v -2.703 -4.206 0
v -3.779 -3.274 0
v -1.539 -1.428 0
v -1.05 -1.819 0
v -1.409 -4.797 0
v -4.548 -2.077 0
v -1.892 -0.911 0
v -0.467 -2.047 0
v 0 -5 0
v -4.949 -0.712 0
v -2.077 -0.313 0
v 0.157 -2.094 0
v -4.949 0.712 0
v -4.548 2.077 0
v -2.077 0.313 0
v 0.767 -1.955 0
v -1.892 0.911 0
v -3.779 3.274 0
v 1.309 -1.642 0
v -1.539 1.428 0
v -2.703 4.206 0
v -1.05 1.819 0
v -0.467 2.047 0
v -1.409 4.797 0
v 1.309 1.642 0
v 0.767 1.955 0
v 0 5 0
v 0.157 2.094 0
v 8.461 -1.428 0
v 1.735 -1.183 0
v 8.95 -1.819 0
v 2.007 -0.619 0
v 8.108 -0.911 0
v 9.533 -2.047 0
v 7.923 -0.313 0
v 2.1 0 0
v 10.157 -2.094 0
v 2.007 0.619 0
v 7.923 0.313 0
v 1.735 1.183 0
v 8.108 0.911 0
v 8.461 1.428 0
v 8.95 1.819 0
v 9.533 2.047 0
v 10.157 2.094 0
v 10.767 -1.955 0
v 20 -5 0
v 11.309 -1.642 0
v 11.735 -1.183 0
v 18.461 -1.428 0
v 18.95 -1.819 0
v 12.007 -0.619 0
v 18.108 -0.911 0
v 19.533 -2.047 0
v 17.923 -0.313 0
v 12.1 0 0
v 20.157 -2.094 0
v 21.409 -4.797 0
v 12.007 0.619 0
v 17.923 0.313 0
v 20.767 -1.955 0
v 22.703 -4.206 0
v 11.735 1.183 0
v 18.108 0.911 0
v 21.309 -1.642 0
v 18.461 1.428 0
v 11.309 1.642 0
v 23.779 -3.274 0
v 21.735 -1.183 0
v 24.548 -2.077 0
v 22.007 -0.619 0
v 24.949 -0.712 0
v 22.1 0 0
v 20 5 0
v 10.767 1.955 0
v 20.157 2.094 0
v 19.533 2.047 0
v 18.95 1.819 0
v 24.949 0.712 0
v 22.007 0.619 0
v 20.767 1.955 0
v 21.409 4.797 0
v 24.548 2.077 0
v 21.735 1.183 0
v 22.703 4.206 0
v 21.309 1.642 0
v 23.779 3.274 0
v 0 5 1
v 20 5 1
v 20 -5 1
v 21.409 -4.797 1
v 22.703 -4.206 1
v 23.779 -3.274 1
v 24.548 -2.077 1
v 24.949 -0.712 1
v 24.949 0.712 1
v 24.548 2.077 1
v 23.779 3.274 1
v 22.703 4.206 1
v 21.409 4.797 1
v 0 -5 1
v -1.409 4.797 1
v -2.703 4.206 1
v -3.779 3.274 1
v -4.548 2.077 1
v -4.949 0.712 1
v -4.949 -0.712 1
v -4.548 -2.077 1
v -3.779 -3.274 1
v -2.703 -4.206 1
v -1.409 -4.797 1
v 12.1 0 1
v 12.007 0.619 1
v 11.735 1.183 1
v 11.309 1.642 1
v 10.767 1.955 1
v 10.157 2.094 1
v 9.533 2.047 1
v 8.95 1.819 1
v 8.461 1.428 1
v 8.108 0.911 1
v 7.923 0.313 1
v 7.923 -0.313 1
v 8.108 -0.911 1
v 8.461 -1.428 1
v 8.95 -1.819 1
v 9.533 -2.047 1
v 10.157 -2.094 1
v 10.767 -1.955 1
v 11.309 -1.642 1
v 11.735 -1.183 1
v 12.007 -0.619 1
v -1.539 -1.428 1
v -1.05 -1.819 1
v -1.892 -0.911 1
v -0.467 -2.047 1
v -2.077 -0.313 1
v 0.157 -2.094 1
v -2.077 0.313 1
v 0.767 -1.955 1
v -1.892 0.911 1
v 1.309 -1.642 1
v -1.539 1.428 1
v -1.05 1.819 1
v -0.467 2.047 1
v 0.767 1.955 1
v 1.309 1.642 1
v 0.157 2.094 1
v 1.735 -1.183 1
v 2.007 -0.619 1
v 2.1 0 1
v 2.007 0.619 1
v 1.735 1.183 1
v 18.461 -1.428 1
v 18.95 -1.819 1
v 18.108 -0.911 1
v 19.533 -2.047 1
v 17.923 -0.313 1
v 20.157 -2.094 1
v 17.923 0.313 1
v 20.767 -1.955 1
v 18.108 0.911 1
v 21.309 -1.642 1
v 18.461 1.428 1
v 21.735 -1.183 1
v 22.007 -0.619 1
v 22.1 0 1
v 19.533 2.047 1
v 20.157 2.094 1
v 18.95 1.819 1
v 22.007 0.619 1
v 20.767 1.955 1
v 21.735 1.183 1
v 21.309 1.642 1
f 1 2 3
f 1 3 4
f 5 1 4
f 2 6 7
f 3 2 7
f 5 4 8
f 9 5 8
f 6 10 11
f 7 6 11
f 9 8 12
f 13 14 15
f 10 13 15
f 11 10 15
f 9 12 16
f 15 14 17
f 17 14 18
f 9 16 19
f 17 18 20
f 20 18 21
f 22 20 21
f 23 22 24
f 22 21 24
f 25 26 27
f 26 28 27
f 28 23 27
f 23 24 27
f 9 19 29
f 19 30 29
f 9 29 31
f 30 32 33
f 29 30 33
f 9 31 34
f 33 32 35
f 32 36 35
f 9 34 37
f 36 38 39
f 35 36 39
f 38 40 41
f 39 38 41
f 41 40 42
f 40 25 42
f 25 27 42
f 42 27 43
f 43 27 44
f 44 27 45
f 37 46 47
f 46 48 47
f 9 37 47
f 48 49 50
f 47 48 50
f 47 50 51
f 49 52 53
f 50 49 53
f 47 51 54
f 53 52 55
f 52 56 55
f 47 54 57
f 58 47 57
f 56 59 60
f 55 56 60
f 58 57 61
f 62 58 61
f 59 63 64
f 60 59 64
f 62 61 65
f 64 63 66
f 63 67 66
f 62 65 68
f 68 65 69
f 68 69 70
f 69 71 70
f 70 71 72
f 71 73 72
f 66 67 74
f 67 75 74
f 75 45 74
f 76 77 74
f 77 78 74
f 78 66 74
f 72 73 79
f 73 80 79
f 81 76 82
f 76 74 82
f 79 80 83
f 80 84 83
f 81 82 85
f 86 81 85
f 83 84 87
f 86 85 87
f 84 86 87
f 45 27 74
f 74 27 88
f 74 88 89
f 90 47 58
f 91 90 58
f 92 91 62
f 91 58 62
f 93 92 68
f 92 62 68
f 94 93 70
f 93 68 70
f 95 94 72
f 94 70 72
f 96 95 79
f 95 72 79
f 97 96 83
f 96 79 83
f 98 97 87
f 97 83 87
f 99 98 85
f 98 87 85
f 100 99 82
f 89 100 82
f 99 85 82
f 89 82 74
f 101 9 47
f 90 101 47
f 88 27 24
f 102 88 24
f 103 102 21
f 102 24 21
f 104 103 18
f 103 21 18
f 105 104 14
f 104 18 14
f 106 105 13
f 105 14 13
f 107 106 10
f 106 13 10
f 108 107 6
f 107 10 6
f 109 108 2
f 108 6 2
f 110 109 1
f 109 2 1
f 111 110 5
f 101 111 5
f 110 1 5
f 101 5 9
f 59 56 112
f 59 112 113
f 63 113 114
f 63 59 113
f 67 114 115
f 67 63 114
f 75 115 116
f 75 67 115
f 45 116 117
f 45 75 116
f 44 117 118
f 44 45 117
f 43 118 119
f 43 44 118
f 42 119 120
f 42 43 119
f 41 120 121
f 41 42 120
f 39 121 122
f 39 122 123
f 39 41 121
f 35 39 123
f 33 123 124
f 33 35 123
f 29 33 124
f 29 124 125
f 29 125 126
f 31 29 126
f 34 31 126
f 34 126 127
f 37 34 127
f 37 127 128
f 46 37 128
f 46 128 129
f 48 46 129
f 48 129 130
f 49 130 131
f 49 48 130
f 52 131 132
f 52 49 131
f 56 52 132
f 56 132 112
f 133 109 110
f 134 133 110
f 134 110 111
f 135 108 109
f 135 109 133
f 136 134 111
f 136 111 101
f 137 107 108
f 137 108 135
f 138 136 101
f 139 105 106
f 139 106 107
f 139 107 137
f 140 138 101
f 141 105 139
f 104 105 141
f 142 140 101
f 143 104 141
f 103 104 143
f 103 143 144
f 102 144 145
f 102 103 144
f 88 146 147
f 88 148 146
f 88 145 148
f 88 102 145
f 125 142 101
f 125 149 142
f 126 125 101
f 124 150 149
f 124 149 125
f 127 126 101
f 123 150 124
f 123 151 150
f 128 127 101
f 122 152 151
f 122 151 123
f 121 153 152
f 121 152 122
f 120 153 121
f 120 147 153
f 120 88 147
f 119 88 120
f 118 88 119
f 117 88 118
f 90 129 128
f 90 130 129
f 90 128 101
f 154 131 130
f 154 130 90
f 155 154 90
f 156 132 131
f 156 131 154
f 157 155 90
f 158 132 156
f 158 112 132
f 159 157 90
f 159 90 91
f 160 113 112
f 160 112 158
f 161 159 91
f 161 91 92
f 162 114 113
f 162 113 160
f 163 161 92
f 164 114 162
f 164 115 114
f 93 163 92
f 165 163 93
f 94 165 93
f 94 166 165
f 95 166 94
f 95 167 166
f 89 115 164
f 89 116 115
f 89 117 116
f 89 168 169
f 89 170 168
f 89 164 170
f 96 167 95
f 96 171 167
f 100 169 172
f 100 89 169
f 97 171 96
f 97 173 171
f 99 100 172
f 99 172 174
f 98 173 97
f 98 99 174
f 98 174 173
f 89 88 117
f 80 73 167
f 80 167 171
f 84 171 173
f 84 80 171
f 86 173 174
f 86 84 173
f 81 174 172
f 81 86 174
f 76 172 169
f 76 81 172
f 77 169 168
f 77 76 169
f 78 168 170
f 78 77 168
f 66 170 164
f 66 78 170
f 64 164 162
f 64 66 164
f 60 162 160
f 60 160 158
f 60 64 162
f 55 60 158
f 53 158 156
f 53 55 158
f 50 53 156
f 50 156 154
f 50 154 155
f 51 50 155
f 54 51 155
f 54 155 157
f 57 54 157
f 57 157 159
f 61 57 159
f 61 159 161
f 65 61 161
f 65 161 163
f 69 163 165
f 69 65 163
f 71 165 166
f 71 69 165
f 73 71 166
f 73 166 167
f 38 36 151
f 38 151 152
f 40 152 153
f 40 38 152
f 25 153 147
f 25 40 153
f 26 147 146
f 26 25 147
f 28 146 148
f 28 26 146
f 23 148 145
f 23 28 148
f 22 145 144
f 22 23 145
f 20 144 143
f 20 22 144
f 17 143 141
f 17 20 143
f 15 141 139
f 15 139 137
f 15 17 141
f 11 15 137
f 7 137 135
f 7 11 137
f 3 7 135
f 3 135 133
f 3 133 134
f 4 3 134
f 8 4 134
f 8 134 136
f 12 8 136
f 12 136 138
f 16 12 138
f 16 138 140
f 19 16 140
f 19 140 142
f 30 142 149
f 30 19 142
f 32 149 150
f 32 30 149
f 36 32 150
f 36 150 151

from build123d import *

# Parameters (mm, degrees)
SKETCH_R  = 2.1
PAD_DEPTH = 1


with BuildPart() as part:
    # Sketch → Pad (new body)
    with BuildSketch(Plane.XY):
        with BuildLine():
            ThreePointArc((0, 5), (-5, 0), (0, -5))
            Line((0, -5), (20, -5))
            ThreePointArc((20, -5), (25, 0), (20, 5))
            Line((0, 5), (20, 5))
        make_face()
        Circle(SKETCH_R, mode=Mode.SUBTRACT)
        with Locations((10, 0)):
            Circle(SKETCH_R, mode=Mode.SUBTRACT)
        with Locations((20, 0)):
            Circle(SKETCH_R, mode=Mode.SUBTRACT)
    extrude(amount=PAD_DEPTH)


solid = part.part
